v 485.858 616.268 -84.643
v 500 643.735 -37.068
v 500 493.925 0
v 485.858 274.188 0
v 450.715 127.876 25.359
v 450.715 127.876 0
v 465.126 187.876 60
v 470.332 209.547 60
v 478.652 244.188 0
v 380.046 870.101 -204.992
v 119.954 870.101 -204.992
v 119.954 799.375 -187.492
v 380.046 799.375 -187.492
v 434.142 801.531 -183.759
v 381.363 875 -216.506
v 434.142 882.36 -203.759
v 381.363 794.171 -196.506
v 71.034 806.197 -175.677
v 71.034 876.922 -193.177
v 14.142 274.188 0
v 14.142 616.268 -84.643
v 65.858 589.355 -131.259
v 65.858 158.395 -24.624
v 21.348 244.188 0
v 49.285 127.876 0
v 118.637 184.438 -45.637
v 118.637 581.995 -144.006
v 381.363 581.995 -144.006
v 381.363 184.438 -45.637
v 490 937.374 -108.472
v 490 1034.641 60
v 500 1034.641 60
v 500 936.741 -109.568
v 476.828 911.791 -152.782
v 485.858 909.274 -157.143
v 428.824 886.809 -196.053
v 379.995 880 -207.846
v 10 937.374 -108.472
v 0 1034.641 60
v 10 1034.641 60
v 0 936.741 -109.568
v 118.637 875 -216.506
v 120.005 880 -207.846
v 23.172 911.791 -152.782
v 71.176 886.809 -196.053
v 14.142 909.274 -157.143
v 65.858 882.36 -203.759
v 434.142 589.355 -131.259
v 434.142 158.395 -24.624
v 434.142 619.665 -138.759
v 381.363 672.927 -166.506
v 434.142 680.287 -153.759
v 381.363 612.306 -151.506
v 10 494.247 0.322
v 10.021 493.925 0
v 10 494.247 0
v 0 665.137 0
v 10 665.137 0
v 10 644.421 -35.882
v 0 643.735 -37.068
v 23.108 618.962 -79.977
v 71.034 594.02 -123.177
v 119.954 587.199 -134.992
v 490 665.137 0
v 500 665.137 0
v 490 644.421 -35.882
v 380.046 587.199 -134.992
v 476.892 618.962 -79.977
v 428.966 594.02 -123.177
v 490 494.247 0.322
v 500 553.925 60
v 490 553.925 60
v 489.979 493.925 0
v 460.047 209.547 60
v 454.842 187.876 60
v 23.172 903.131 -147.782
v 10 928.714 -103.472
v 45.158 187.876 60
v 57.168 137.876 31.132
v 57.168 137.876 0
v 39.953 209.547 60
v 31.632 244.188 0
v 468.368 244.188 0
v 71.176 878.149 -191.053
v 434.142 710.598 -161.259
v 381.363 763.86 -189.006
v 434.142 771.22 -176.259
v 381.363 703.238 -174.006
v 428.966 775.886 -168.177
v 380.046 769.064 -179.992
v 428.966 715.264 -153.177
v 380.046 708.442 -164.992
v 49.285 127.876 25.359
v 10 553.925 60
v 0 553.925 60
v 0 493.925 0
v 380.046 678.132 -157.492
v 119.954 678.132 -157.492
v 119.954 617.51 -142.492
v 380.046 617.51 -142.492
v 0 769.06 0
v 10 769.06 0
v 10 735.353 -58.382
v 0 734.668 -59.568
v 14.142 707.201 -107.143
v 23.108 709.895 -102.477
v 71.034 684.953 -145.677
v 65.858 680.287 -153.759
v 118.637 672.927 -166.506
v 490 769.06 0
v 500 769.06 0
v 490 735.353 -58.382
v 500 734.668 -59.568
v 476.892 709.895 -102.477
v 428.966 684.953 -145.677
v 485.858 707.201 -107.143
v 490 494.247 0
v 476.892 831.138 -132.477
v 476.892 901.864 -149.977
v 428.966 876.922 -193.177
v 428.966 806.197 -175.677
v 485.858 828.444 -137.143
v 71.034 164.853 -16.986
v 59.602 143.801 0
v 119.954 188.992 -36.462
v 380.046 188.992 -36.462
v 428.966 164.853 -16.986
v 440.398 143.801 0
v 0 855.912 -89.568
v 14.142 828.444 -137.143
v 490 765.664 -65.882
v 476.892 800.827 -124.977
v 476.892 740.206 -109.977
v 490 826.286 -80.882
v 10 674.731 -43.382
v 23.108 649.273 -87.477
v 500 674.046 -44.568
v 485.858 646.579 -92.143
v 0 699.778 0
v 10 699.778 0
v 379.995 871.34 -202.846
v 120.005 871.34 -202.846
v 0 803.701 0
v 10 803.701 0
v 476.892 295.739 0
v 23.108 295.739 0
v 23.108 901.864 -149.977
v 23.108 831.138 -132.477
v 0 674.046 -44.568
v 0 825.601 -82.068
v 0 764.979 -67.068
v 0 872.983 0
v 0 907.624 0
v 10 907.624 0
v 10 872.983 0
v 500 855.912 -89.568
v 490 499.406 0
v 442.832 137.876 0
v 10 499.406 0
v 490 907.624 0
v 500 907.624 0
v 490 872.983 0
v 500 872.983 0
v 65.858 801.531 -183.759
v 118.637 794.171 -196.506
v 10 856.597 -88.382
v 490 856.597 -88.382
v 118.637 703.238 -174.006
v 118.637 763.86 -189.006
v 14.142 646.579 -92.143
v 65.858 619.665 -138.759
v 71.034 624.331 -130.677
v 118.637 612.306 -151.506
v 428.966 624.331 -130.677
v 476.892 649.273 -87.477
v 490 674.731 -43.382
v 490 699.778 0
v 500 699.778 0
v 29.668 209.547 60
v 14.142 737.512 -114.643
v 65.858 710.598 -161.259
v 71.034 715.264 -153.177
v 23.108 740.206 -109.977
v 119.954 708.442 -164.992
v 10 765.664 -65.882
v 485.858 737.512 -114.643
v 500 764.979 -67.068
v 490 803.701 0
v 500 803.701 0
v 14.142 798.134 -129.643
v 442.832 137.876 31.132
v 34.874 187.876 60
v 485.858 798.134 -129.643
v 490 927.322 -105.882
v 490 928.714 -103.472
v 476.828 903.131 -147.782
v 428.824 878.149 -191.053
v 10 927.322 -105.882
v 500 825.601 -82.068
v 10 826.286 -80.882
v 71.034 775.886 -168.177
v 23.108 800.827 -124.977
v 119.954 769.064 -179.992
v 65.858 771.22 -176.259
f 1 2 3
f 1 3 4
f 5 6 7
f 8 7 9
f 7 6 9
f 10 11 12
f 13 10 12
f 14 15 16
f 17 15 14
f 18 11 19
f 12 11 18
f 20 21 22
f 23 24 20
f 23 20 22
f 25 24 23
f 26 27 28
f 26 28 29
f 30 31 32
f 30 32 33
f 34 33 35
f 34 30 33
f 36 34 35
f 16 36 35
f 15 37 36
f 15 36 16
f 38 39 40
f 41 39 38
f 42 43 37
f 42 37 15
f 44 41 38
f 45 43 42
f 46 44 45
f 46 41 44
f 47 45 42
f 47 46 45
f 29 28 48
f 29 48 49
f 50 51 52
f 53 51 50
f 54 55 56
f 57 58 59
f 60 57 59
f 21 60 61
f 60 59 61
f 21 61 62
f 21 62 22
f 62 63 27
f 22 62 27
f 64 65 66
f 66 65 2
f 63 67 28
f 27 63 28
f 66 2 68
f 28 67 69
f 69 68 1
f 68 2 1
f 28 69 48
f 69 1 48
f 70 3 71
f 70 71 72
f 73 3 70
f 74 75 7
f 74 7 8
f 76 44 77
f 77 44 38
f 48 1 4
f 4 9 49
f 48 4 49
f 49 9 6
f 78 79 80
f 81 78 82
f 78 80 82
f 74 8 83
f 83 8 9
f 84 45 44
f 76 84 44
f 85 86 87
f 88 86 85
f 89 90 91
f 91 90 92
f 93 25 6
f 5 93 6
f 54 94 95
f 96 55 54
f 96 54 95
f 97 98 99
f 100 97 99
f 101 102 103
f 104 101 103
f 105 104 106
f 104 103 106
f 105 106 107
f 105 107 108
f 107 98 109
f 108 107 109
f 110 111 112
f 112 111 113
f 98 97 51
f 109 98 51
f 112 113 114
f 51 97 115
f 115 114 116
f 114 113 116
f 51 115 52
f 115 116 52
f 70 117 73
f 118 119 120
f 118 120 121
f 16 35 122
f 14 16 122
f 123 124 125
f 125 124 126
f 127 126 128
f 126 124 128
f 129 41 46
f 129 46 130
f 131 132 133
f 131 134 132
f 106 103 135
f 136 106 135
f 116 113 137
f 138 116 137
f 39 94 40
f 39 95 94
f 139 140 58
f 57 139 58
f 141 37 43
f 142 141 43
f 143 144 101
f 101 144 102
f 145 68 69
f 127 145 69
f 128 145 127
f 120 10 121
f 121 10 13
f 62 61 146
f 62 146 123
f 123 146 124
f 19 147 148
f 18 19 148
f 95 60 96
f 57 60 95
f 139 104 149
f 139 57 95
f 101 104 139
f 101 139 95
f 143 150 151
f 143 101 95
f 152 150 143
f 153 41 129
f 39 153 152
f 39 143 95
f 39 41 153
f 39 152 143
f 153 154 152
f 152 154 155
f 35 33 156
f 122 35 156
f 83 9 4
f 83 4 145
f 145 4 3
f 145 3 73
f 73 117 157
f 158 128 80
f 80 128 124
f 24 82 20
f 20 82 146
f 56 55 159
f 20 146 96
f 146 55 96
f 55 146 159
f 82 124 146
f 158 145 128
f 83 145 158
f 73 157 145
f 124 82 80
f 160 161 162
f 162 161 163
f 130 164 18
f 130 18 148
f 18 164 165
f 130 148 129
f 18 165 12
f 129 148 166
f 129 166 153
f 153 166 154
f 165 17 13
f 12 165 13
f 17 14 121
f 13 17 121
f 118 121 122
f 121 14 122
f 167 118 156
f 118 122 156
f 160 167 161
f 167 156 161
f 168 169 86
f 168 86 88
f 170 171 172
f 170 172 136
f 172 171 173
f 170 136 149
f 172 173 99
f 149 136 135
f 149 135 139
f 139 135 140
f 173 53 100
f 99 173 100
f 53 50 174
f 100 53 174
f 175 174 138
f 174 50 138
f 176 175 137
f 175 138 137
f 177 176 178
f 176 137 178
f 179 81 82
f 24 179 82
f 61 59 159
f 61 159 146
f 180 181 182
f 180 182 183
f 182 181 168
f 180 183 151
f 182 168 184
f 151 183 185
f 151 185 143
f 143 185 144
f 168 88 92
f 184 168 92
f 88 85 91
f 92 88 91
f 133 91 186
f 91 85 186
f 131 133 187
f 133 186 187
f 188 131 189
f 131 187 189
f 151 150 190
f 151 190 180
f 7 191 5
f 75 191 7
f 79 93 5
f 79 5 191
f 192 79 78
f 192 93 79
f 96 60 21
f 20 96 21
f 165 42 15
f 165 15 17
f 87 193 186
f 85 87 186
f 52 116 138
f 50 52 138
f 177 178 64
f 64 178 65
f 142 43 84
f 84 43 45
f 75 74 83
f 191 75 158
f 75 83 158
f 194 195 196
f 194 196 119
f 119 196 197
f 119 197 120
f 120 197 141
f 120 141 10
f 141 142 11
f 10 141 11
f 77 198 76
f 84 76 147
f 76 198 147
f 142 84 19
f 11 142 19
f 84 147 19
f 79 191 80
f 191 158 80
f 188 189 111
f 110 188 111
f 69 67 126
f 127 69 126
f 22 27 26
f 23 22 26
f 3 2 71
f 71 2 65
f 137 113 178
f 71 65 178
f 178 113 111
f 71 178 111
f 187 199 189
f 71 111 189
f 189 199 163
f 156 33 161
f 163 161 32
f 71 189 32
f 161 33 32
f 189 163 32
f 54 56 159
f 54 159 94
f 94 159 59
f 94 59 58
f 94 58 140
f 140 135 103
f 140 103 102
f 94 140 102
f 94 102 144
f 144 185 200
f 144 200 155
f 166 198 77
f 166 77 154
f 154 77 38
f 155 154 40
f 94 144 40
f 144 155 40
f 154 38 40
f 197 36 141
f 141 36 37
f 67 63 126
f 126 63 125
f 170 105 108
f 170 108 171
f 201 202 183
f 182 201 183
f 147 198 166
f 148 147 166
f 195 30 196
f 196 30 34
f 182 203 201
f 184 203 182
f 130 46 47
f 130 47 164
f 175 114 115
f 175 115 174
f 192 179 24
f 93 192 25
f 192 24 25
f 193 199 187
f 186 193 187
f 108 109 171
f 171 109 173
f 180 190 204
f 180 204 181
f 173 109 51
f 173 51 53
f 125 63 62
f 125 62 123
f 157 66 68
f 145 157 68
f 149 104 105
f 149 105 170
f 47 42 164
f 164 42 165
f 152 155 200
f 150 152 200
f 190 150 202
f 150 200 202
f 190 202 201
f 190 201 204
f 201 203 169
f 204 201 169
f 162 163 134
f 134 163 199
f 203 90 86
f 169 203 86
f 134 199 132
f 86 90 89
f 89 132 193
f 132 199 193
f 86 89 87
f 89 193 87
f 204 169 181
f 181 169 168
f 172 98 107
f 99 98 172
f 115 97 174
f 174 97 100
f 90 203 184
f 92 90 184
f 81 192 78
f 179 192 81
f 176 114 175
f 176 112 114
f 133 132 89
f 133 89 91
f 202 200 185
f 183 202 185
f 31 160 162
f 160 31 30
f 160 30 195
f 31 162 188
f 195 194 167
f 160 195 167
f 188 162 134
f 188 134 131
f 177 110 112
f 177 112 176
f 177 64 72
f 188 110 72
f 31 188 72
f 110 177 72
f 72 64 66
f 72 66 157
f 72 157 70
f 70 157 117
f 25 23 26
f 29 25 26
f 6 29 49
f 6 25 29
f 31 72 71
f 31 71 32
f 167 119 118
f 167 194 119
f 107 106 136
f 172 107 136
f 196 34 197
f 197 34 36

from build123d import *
from OCP.BRepFilletAPI import BRepFilletAPI_MakeChamfer

# Parameters (mm, degrees)
BOSS_EXTRU_1_DEPTH                  = 500
CHANFREIN2_SIZE                     = 80
CHANFREIN3_SIZE                     = 19.999999999999996
CHANFREIN3_SIZE2                    = 38.63703305156302
CHANFREIN3_SIZE2_2                  = 38.63703305156301
CHANFREIN4_SIZE                     = 190.00000000000003
CHANFREIN4_SIZE2                    = 127.87558157978762
BOSS_EXTRU_2_DEPTH                  = 60
BOSS_EXTRU_3_DEPTH                  = 500
COQUE1_T                            = 10
ENL_V_MAT_EXTRU_2_REACH             = 940.137
ENL_V_MAT_EXTRU_2_DIRECTION_2_DEPTH = 939.1366191668232
ENL_V_START                         = -60
ENL_V_MAT_EXTRU_3_DEPTH             = 60
ENL_V_MAT_EXTRU_4_DEPTH             = 1170.3404261816813
CHANFREIN6_SIZE                     = 34.641016151
CHANFREIN6_SIZE_2                   = 60
CHANFREIN7_SIZE                     = 60
ENL_V_MAT_EXTRU_5_DEPTH             = 1170.3404261816813


# Some blends are built 0.0001 mm under size
with BuildPart() as part:
    # Esquisse3 → Boss.-Extru.1 (new body)
    with BuildSketch(Plane(origin=(0, 0, 0), x_dir=(0, 0, -1), z_dir=(1, 0, 0))):
        Polygon((0, 0), (0, 1000), (216.50635094611002, 875.0000000000006), align=None)
    extrude(amount=BOSS_EXTRU_1_DEPTH)

    # Chanfrein2
    chanfrein2_edges = [part.edges().sort_by_distance(p)[0] for p in [
        (500, 437.5000000000003, -108.25317547305501),
        (0, 437.5000000000003, -108.25317547305501),
    ]]
    chamfer(chanfrein2_edges, length=CHANFREIN2_SIZE)

    # Chanfrein3: one chamfer whose edges measure the first distance from different faces: ONE call of the kernel's chamfer builder (chamfer() names one face for all edges)
    chanfrein3_edges_1 = [part.edges().sort_by_distance(p)[0] for p in [
        (500, 624.8499399519503, -72.19766271841472),
        (420, 437.5000000000003, -108.25317547305504),
    ]]
    chanfrein3_side_1 = [part.faces().sort_by_distance(p)[0] for p in [
        (457.3358939482921, 524.9359686158087, -91.42611546732361),
    ]]
    chanfrein3_edges_2 = [part.edges().sort_by_distance(p)[0] for p in [
        (80, 437.50000000000017, -108.25317547305501),
        (0, 624.8499399519503, -72.1976627184147),
    ]]
    chanfrein3_side_2 = [part.faces().sort_by_distance(p)[0] for p in [
        (42.664106051707925, 524.9359686158089, -91.42611546732363),
    ]]
    chanfrein3 = BRepFilletAPI_MakeChamfer(part.part.solid().wrapped)
    for e in chanfrein3_edges_1:
        chanfrein3.Add(CHANFREIN3_SIZE, CHANFREIN3_SIZE2, e.wrapped, chanfrein3_side_1[0].wrapped)  # the first distance lies on this face
    for e in chanfrein3_edges_2:
        chanfrein3.Add(CHANFREIN3_SIZE, CHANFREIN3_SIZE2_2, e.wrapped, chanfrein3_side_2[0].wrapped)  # the first distance lies on this face
    add(Compound.cast(chanfrein3.Shape()), mode=Mode.REPLACE)

    # Chanfrein4
    chanfrein4_edges = [part.edges().sort_by_distance(p)[0] for p in [
        (249.99999999999994, 0, 0),
    ]]
    chanfrein4_side = [part.faces().sort_by_distance(p)[0] for p in [
        (249.99999999999997, 437.5000000000003, -108.25317547305502),
    ]]
    chamfer(chanfrein4_edges, length=CHANFREIN4_SIZE, length2=CHANFREIN4_SIZE2, reference=chanfrein4_side[0])

    # Esquisse4 → Boss.-Extru.2 (add)
    with BuildSketch(Plane.XY):
        Polygon((500, 1000), (0, 1000), (6.94e-15, 493.9253559619593), (14.142135623731011, 274.1881541390633), (49.28527880731526, 127.87558157978796), (450.7147211926849, 127.87558157978796), (485.85786437626905, 274.18815413906196), (500, 493.92535596195466), align=None)
    extrude(amount=BOSS_EXTRU_2_DEPTH)

    # Esquisse5 → Boss.-Extru.3 (add)
    with BuildSketch(Plane.ZY):
        Polygon((60, 1000), (60, 1034.6410161513777), (0, 1000), align=None)
    extrude(amount=-BOSS_EXTRU_3_DEPTH)

    # Coque1 (no face opened: a closed hollow body)
    add(offset(amount=-COQUE1_T, mode=Mode.PRIVATE), mode=Mode.SUBTRACT)

    # Esquisse6 → Enlèv. mat.-Extru.2 (cut, up to next)
    with BuildSketch(Plane(origin=(0, 750.0000000000025, -433.0127018922181), x_dir=(1, 0, 0), z_dir=(0, 0.86602540378444, -0.49999999999999784)), mode=Mode.PRIVATE) as enl_v_mat_extru_2_sk1:
        Polygon((10, -569.2820323027529), (10, -757.501187283232), (489.99999999999983, -757.5011872832318), (489.99999999999994, -569.2820323027527), (489.9999999999996, -374.7478772728107), (476.8280711810083, -323.58228852611177), (428.823967356419, -273.61803314286686), (379.9946243192759, -259.99999999999744), (120.00537568072383, -259.99999999999756), (71.17603264358065, -273.618033142867), (23.171928818991503, -323.58228852611194), (10.000000000000268, -374.74787727281085), align=None)
    enl_v_mat_extru_2_tool1 = extrude(enl_v_mat_extru_2_sk1.sketch, amount=-ENL_V_MAT_EXTRU_2_REACH, mode=Mode.PRIVATE) & part.part
    add(enl_v_mat_extru_2_tool1.solids().sort_by_distance((250, 1007.562635, 13.098868))[0], mode=Mode.SUBTRACT)

    # Esquisse6 → Enlèv. mat.-Extru.2 direction 2 (cut)
    with BuildSketch(Plane(origin=(0, 750.0000000000025, -433.0127018922181), x_dir=(1, 0, 0), z_dir=(0, 0.86602540378444, -0.49999999999999784))):
        Polygon((10, -569.2820323027529), (10, -757.501187283232), (489.99999999999983, -757.5011872832318), (489.99999999999994, -569.2820323027527), (489.9999999999996, -374.7478772728107), (476.8280711810083, -323.58228852611177), (428.823967356419, -273.61803314286686), (379.9946243192759, -259.99999999999744), (120.00537568072383, -259.99999999999756), (71.17603264358065, -273.618033142867), (23.171928818991503, -323.58228852611194), (10.000000000000268, -374.74787727281085), align=None)
    extrude(amount=ENL_V_MAT_EXTRU_2_DIRECTION_2_DEPTH, mode=Mode.SUBTRACT)

    # Esquisse7 → Enlèv. mat.-Extru.3 (cut)
    with BuildSketch(Plane.XY.offset(60).offset(ENL_V_START)):
        Polygon((475.93370620438793, 275.68803078848794), (442.8322266096682, 137.87558157978802), (57.16777339033198, 137.87558157978796), (24.066293795611983, 275.6880307884899), (10.000000000000009, 494.2468199914388), (10, 1034.6410161513777), (489.99999999999864, 1034.6410161513782), (489.9999999999996, 494.2468199914393), align=None)
    extrude(amount=ENL_V_MAT_EXTRU_3_DEPTH, mode=Mode.SUBTRACT)

    # Esquisse8 → Enlèv. mat.-Extru.4 (cut, through all)
    with BuildSketch(Plane(origin=(500, 0, 0), x_dir=(0, 0, -1), z_dir=(1, 0, 0))):
        Polygon((-60, 493.92535596195466), (0, 493.92535596195466), (-1.388e-14, 274.18815413906196), (-1.388e-14, 244.18815413906194), (-59.99999999999999, 244.18815413906194), (-60, 274.18815413906196), align=None)
    extrude(amount=-ENL_V_MAT_EXTRU_4_DEPTH, mode=Mode.SUBTRACT)

    # Chanfrein6
    # the kernel refuses this chamfer: 60, 34.641016151 mm, written as the material it takes off along each edge
    with BuildSketch(Plane(origin=(186.85746471381282, 244.1881541390619, 60), x_dir=(0, -0.9983227437537926, 0.05789386240267061), z_dir=(-1, 0, 0))) as chanfrein6_piece_1_section:
        Polygon((CHANFREIN6_SIZE * 0.998322743765, -CHANFREIN6_SIZE * 0.0578938624033), (-CHANFREIN6_SIZE_2 * 0.0578938624027, -CHANFREIN6_SIZE_2 * 0.998322743754), (0, 0), align=None)
    chanfrein6_piece_1 = extrude(amount=320.73470744761204, mode=Mode.PRIVATE)
    chanfrein6_piece_1 = split(chanfrein6_piece_1, bisect_by=Plane(origin=(26.49011099000677, 233.04123739645672, 1.648e-14), z_dir=(0, 6e-17, 1)), keep=Keep.TOP, mode=Mode.PRIVATE)
    add(chanfrein6_piece_1, mode=Mode.SUBTRACT)
    with BuildSketch(Plane(origin=(-105.93986647144428, 127.87558157978796, 60), x_dir=(0, -0.05789386240267084, -0.9983227437537926), z_dir=(1, 0, 0))) as chanfrein6_piece_2:
        Polygon((CHANFREIN6_SIZE * 0.998322743765, CHANFREIN6_SIZE * 0.0578938624033), (-CHANFREIN6_SIZE_2 * 0.0578938624027, CHANFREIN6_SIZE_2 * 0.998322743754), (0, 0), align=None)
    extrude(amount=711.8797329428887, mode=Mode.SUBTRACT)
    with BuildSketch(Plane(origin=(633.8772427337997, 244.1881541390619, 60), x_dir=(0, -0.9983227437537926, 0.05789386240267061), z_dir=(-1, 0, 0))) as chanfrein6_piece_3_section:
        Polygon((CHANFREIN6_SIZE * 0.998322743765, -CHANFREIN6_SIZE * 0.0578938624033), (-CHANFREIN6_SIZE_2 * 0.0578938624027, -CHANFREIN6_SIZE_2 * 0.998322743754), (0, 0), align=None)
    chanfrein6_piece_3 = extrude(amount=320.7347074476121, mode=Mode.PRIVATE)
    chanfrein6_piece_3 = split(chanfrein6_piece_3, bisect_by=Plane(origin=(473.5098890099937, 233.04123739645678, 1.648e-14), z_dir=(0, 6e-17, 1)), keep=Keep.TOP, mode=Mode.PRIVATE)
    add(chanfrein6_piece_3, mode=Mode.SUBTRACT)

    # Chanfrein7
    chanfrein7_edges = [part.edges().sort_by_distance(p)[0] for p in [
        (5.010344602246278, 493.92535596195466, 60),
        (494.98965539775355, 493.92535596195466, 60),
    ]]
    chamfer(chanfrein7_edges, length=CHANFREIN7_SIZE - 0.0001)  # a hair under: the kernel refuses the full size

    # Esquisse10 → Enlèv. mat.-Extru.5 (cut, through all)
    with BuildSketch(Plane(origin=(500, 0, 0), x_dir=(0, 0, -1), z_dir=(1, 0, 0))):
        Polygon((196.50635094610988, 794.1709623134528), (2.06e-15, 907.6239569296604), (4.01e-15, 872.9829407782828), (189.0063509461099, 763.8600731809975), align=None)
        Polygon((174.00635094610982, 703.2382949160867), (1.402e-14, 803.7009084755275), (1.911e-14, 769.0598923241499), (166.50635094610982, 672.9274057836313), align=None)
        Polygon((151.50635094610985, 612.3056275187206), (2.603e-14, 699.7778600213949), (3.259e-14, 665.1368438700174), (144.00635094610985, 581.9947383862652), align=None)
    extrude(amount=-ENL_V_MAT_EXTRU_5_DEPTH, mode=Mode.SUBTRACT)


solid = part.part
